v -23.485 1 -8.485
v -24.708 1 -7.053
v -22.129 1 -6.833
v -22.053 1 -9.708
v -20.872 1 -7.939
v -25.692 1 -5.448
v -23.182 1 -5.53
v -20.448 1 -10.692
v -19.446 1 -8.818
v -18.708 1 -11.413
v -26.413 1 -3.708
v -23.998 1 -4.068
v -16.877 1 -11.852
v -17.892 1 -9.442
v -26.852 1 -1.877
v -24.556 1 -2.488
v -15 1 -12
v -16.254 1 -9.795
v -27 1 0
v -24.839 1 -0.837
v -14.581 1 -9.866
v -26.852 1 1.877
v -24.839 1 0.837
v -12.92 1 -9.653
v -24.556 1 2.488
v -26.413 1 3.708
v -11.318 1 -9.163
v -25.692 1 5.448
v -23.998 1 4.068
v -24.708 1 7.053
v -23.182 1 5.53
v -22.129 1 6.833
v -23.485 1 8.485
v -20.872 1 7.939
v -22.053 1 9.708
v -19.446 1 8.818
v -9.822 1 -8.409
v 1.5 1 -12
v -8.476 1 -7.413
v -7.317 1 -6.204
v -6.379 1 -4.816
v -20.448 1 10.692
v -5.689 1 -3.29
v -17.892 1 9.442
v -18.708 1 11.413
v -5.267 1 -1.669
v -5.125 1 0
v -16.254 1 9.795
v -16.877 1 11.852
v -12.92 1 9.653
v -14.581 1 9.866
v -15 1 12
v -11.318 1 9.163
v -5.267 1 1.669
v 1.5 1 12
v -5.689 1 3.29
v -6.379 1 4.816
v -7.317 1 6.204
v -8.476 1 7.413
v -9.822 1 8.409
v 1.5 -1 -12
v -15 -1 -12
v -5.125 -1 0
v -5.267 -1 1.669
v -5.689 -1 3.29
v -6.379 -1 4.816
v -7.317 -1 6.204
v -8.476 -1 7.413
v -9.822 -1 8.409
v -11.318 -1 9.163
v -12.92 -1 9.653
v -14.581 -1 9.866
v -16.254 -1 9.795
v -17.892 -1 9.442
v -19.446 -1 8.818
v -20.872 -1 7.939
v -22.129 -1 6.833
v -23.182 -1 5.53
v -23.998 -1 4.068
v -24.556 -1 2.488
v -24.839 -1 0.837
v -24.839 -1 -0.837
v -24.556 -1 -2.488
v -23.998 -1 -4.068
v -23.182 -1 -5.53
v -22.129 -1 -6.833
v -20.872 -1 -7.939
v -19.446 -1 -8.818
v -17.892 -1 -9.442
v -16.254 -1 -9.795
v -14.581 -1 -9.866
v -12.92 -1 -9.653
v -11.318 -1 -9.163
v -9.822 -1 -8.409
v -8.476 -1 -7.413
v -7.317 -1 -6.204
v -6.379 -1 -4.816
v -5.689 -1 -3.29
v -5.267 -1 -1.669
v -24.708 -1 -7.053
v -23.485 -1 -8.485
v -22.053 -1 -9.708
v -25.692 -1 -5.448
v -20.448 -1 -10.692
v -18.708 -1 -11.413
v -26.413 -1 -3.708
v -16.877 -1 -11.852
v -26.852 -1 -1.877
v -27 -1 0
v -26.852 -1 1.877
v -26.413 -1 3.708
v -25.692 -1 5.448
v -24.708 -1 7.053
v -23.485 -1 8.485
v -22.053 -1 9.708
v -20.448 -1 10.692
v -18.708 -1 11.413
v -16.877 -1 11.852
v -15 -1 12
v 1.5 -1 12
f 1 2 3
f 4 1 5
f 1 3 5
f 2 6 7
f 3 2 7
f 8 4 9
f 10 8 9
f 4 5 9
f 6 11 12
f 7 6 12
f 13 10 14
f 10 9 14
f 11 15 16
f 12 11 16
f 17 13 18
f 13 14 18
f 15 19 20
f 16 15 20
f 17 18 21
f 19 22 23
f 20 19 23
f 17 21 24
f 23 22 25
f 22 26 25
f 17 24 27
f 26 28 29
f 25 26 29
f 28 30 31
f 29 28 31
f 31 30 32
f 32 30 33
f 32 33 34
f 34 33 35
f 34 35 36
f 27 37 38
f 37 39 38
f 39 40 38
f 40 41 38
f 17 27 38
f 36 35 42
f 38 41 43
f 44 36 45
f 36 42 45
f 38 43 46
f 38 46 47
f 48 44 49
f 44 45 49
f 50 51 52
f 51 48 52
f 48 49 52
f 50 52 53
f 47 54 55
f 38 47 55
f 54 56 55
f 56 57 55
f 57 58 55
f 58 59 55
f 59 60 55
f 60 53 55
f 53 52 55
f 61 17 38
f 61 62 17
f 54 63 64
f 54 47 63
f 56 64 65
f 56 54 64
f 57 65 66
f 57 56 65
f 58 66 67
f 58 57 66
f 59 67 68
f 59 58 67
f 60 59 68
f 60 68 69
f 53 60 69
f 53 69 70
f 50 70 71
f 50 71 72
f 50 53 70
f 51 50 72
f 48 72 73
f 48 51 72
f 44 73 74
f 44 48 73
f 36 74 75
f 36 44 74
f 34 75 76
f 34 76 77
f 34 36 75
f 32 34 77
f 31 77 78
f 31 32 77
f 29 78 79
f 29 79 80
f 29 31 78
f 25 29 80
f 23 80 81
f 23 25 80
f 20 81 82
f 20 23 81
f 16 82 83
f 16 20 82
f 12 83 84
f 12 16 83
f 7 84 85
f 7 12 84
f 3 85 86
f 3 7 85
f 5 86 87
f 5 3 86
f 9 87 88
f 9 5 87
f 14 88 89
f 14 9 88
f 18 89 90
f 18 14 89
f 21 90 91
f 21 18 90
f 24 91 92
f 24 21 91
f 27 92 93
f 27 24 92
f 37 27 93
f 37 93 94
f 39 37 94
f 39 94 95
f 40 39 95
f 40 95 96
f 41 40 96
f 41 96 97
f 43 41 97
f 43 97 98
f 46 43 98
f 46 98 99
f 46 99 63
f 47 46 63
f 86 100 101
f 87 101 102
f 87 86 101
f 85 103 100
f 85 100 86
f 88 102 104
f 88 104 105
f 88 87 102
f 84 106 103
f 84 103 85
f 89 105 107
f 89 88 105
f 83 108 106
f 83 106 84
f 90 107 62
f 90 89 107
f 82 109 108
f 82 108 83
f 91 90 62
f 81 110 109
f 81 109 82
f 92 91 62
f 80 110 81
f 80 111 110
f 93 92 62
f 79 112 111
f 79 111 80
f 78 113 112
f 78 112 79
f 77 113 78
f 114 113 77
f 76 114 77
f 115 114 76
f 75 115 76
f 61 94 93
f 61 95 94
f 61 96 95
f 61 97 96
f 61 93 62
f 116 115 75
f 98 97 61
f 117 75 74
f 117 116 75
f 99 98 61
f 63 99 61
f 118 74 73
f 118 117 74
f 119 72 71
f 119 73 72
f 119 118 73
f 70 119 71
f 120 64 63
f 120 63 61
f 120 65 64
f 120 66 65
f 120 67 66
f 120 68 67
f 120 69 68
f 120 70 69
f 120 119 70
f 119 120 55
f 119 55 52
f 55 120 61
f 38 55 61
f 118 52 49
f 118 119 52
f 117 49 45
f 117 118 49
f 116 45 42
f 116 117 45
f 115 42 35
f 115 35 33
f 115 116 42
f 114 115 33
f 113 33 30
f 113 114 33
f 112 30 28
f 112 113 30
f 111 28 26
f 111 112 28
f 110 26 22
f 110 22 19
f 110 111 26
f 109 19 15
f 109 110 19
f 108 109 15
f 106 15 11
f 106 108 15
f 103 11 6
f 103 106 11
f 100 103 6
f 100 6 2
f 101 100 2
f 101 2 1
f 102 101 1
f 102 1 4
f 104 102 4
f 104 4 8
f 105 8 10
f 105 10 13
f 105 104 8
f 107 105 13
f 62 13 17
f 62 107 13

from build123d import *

# Parameters (mm, degrees)
SKETCH_R  = 9.875
PAD_DEPTH = 1


with BuildPart() as part:
    # Sketch → Pad (new body, symmetric)
    with BuildSketch(Plane.XZ):
        with BuildLine():
            Line((-15, -12), (1.5, -12))
            Line((1.5, 12), (1.5, -12))
            Line((1.5, 12), (-15, 12))
            ThreePointArc((-15, 12), (-27, 0), (-15, -12))
        make_face()
        with Locations((-15, 0)):
            Circle(SKETCH_R, mode=Mode.SUBTRACT)
    extrude(amount=PAD_DEPTH, both=True)


solid = part.part
